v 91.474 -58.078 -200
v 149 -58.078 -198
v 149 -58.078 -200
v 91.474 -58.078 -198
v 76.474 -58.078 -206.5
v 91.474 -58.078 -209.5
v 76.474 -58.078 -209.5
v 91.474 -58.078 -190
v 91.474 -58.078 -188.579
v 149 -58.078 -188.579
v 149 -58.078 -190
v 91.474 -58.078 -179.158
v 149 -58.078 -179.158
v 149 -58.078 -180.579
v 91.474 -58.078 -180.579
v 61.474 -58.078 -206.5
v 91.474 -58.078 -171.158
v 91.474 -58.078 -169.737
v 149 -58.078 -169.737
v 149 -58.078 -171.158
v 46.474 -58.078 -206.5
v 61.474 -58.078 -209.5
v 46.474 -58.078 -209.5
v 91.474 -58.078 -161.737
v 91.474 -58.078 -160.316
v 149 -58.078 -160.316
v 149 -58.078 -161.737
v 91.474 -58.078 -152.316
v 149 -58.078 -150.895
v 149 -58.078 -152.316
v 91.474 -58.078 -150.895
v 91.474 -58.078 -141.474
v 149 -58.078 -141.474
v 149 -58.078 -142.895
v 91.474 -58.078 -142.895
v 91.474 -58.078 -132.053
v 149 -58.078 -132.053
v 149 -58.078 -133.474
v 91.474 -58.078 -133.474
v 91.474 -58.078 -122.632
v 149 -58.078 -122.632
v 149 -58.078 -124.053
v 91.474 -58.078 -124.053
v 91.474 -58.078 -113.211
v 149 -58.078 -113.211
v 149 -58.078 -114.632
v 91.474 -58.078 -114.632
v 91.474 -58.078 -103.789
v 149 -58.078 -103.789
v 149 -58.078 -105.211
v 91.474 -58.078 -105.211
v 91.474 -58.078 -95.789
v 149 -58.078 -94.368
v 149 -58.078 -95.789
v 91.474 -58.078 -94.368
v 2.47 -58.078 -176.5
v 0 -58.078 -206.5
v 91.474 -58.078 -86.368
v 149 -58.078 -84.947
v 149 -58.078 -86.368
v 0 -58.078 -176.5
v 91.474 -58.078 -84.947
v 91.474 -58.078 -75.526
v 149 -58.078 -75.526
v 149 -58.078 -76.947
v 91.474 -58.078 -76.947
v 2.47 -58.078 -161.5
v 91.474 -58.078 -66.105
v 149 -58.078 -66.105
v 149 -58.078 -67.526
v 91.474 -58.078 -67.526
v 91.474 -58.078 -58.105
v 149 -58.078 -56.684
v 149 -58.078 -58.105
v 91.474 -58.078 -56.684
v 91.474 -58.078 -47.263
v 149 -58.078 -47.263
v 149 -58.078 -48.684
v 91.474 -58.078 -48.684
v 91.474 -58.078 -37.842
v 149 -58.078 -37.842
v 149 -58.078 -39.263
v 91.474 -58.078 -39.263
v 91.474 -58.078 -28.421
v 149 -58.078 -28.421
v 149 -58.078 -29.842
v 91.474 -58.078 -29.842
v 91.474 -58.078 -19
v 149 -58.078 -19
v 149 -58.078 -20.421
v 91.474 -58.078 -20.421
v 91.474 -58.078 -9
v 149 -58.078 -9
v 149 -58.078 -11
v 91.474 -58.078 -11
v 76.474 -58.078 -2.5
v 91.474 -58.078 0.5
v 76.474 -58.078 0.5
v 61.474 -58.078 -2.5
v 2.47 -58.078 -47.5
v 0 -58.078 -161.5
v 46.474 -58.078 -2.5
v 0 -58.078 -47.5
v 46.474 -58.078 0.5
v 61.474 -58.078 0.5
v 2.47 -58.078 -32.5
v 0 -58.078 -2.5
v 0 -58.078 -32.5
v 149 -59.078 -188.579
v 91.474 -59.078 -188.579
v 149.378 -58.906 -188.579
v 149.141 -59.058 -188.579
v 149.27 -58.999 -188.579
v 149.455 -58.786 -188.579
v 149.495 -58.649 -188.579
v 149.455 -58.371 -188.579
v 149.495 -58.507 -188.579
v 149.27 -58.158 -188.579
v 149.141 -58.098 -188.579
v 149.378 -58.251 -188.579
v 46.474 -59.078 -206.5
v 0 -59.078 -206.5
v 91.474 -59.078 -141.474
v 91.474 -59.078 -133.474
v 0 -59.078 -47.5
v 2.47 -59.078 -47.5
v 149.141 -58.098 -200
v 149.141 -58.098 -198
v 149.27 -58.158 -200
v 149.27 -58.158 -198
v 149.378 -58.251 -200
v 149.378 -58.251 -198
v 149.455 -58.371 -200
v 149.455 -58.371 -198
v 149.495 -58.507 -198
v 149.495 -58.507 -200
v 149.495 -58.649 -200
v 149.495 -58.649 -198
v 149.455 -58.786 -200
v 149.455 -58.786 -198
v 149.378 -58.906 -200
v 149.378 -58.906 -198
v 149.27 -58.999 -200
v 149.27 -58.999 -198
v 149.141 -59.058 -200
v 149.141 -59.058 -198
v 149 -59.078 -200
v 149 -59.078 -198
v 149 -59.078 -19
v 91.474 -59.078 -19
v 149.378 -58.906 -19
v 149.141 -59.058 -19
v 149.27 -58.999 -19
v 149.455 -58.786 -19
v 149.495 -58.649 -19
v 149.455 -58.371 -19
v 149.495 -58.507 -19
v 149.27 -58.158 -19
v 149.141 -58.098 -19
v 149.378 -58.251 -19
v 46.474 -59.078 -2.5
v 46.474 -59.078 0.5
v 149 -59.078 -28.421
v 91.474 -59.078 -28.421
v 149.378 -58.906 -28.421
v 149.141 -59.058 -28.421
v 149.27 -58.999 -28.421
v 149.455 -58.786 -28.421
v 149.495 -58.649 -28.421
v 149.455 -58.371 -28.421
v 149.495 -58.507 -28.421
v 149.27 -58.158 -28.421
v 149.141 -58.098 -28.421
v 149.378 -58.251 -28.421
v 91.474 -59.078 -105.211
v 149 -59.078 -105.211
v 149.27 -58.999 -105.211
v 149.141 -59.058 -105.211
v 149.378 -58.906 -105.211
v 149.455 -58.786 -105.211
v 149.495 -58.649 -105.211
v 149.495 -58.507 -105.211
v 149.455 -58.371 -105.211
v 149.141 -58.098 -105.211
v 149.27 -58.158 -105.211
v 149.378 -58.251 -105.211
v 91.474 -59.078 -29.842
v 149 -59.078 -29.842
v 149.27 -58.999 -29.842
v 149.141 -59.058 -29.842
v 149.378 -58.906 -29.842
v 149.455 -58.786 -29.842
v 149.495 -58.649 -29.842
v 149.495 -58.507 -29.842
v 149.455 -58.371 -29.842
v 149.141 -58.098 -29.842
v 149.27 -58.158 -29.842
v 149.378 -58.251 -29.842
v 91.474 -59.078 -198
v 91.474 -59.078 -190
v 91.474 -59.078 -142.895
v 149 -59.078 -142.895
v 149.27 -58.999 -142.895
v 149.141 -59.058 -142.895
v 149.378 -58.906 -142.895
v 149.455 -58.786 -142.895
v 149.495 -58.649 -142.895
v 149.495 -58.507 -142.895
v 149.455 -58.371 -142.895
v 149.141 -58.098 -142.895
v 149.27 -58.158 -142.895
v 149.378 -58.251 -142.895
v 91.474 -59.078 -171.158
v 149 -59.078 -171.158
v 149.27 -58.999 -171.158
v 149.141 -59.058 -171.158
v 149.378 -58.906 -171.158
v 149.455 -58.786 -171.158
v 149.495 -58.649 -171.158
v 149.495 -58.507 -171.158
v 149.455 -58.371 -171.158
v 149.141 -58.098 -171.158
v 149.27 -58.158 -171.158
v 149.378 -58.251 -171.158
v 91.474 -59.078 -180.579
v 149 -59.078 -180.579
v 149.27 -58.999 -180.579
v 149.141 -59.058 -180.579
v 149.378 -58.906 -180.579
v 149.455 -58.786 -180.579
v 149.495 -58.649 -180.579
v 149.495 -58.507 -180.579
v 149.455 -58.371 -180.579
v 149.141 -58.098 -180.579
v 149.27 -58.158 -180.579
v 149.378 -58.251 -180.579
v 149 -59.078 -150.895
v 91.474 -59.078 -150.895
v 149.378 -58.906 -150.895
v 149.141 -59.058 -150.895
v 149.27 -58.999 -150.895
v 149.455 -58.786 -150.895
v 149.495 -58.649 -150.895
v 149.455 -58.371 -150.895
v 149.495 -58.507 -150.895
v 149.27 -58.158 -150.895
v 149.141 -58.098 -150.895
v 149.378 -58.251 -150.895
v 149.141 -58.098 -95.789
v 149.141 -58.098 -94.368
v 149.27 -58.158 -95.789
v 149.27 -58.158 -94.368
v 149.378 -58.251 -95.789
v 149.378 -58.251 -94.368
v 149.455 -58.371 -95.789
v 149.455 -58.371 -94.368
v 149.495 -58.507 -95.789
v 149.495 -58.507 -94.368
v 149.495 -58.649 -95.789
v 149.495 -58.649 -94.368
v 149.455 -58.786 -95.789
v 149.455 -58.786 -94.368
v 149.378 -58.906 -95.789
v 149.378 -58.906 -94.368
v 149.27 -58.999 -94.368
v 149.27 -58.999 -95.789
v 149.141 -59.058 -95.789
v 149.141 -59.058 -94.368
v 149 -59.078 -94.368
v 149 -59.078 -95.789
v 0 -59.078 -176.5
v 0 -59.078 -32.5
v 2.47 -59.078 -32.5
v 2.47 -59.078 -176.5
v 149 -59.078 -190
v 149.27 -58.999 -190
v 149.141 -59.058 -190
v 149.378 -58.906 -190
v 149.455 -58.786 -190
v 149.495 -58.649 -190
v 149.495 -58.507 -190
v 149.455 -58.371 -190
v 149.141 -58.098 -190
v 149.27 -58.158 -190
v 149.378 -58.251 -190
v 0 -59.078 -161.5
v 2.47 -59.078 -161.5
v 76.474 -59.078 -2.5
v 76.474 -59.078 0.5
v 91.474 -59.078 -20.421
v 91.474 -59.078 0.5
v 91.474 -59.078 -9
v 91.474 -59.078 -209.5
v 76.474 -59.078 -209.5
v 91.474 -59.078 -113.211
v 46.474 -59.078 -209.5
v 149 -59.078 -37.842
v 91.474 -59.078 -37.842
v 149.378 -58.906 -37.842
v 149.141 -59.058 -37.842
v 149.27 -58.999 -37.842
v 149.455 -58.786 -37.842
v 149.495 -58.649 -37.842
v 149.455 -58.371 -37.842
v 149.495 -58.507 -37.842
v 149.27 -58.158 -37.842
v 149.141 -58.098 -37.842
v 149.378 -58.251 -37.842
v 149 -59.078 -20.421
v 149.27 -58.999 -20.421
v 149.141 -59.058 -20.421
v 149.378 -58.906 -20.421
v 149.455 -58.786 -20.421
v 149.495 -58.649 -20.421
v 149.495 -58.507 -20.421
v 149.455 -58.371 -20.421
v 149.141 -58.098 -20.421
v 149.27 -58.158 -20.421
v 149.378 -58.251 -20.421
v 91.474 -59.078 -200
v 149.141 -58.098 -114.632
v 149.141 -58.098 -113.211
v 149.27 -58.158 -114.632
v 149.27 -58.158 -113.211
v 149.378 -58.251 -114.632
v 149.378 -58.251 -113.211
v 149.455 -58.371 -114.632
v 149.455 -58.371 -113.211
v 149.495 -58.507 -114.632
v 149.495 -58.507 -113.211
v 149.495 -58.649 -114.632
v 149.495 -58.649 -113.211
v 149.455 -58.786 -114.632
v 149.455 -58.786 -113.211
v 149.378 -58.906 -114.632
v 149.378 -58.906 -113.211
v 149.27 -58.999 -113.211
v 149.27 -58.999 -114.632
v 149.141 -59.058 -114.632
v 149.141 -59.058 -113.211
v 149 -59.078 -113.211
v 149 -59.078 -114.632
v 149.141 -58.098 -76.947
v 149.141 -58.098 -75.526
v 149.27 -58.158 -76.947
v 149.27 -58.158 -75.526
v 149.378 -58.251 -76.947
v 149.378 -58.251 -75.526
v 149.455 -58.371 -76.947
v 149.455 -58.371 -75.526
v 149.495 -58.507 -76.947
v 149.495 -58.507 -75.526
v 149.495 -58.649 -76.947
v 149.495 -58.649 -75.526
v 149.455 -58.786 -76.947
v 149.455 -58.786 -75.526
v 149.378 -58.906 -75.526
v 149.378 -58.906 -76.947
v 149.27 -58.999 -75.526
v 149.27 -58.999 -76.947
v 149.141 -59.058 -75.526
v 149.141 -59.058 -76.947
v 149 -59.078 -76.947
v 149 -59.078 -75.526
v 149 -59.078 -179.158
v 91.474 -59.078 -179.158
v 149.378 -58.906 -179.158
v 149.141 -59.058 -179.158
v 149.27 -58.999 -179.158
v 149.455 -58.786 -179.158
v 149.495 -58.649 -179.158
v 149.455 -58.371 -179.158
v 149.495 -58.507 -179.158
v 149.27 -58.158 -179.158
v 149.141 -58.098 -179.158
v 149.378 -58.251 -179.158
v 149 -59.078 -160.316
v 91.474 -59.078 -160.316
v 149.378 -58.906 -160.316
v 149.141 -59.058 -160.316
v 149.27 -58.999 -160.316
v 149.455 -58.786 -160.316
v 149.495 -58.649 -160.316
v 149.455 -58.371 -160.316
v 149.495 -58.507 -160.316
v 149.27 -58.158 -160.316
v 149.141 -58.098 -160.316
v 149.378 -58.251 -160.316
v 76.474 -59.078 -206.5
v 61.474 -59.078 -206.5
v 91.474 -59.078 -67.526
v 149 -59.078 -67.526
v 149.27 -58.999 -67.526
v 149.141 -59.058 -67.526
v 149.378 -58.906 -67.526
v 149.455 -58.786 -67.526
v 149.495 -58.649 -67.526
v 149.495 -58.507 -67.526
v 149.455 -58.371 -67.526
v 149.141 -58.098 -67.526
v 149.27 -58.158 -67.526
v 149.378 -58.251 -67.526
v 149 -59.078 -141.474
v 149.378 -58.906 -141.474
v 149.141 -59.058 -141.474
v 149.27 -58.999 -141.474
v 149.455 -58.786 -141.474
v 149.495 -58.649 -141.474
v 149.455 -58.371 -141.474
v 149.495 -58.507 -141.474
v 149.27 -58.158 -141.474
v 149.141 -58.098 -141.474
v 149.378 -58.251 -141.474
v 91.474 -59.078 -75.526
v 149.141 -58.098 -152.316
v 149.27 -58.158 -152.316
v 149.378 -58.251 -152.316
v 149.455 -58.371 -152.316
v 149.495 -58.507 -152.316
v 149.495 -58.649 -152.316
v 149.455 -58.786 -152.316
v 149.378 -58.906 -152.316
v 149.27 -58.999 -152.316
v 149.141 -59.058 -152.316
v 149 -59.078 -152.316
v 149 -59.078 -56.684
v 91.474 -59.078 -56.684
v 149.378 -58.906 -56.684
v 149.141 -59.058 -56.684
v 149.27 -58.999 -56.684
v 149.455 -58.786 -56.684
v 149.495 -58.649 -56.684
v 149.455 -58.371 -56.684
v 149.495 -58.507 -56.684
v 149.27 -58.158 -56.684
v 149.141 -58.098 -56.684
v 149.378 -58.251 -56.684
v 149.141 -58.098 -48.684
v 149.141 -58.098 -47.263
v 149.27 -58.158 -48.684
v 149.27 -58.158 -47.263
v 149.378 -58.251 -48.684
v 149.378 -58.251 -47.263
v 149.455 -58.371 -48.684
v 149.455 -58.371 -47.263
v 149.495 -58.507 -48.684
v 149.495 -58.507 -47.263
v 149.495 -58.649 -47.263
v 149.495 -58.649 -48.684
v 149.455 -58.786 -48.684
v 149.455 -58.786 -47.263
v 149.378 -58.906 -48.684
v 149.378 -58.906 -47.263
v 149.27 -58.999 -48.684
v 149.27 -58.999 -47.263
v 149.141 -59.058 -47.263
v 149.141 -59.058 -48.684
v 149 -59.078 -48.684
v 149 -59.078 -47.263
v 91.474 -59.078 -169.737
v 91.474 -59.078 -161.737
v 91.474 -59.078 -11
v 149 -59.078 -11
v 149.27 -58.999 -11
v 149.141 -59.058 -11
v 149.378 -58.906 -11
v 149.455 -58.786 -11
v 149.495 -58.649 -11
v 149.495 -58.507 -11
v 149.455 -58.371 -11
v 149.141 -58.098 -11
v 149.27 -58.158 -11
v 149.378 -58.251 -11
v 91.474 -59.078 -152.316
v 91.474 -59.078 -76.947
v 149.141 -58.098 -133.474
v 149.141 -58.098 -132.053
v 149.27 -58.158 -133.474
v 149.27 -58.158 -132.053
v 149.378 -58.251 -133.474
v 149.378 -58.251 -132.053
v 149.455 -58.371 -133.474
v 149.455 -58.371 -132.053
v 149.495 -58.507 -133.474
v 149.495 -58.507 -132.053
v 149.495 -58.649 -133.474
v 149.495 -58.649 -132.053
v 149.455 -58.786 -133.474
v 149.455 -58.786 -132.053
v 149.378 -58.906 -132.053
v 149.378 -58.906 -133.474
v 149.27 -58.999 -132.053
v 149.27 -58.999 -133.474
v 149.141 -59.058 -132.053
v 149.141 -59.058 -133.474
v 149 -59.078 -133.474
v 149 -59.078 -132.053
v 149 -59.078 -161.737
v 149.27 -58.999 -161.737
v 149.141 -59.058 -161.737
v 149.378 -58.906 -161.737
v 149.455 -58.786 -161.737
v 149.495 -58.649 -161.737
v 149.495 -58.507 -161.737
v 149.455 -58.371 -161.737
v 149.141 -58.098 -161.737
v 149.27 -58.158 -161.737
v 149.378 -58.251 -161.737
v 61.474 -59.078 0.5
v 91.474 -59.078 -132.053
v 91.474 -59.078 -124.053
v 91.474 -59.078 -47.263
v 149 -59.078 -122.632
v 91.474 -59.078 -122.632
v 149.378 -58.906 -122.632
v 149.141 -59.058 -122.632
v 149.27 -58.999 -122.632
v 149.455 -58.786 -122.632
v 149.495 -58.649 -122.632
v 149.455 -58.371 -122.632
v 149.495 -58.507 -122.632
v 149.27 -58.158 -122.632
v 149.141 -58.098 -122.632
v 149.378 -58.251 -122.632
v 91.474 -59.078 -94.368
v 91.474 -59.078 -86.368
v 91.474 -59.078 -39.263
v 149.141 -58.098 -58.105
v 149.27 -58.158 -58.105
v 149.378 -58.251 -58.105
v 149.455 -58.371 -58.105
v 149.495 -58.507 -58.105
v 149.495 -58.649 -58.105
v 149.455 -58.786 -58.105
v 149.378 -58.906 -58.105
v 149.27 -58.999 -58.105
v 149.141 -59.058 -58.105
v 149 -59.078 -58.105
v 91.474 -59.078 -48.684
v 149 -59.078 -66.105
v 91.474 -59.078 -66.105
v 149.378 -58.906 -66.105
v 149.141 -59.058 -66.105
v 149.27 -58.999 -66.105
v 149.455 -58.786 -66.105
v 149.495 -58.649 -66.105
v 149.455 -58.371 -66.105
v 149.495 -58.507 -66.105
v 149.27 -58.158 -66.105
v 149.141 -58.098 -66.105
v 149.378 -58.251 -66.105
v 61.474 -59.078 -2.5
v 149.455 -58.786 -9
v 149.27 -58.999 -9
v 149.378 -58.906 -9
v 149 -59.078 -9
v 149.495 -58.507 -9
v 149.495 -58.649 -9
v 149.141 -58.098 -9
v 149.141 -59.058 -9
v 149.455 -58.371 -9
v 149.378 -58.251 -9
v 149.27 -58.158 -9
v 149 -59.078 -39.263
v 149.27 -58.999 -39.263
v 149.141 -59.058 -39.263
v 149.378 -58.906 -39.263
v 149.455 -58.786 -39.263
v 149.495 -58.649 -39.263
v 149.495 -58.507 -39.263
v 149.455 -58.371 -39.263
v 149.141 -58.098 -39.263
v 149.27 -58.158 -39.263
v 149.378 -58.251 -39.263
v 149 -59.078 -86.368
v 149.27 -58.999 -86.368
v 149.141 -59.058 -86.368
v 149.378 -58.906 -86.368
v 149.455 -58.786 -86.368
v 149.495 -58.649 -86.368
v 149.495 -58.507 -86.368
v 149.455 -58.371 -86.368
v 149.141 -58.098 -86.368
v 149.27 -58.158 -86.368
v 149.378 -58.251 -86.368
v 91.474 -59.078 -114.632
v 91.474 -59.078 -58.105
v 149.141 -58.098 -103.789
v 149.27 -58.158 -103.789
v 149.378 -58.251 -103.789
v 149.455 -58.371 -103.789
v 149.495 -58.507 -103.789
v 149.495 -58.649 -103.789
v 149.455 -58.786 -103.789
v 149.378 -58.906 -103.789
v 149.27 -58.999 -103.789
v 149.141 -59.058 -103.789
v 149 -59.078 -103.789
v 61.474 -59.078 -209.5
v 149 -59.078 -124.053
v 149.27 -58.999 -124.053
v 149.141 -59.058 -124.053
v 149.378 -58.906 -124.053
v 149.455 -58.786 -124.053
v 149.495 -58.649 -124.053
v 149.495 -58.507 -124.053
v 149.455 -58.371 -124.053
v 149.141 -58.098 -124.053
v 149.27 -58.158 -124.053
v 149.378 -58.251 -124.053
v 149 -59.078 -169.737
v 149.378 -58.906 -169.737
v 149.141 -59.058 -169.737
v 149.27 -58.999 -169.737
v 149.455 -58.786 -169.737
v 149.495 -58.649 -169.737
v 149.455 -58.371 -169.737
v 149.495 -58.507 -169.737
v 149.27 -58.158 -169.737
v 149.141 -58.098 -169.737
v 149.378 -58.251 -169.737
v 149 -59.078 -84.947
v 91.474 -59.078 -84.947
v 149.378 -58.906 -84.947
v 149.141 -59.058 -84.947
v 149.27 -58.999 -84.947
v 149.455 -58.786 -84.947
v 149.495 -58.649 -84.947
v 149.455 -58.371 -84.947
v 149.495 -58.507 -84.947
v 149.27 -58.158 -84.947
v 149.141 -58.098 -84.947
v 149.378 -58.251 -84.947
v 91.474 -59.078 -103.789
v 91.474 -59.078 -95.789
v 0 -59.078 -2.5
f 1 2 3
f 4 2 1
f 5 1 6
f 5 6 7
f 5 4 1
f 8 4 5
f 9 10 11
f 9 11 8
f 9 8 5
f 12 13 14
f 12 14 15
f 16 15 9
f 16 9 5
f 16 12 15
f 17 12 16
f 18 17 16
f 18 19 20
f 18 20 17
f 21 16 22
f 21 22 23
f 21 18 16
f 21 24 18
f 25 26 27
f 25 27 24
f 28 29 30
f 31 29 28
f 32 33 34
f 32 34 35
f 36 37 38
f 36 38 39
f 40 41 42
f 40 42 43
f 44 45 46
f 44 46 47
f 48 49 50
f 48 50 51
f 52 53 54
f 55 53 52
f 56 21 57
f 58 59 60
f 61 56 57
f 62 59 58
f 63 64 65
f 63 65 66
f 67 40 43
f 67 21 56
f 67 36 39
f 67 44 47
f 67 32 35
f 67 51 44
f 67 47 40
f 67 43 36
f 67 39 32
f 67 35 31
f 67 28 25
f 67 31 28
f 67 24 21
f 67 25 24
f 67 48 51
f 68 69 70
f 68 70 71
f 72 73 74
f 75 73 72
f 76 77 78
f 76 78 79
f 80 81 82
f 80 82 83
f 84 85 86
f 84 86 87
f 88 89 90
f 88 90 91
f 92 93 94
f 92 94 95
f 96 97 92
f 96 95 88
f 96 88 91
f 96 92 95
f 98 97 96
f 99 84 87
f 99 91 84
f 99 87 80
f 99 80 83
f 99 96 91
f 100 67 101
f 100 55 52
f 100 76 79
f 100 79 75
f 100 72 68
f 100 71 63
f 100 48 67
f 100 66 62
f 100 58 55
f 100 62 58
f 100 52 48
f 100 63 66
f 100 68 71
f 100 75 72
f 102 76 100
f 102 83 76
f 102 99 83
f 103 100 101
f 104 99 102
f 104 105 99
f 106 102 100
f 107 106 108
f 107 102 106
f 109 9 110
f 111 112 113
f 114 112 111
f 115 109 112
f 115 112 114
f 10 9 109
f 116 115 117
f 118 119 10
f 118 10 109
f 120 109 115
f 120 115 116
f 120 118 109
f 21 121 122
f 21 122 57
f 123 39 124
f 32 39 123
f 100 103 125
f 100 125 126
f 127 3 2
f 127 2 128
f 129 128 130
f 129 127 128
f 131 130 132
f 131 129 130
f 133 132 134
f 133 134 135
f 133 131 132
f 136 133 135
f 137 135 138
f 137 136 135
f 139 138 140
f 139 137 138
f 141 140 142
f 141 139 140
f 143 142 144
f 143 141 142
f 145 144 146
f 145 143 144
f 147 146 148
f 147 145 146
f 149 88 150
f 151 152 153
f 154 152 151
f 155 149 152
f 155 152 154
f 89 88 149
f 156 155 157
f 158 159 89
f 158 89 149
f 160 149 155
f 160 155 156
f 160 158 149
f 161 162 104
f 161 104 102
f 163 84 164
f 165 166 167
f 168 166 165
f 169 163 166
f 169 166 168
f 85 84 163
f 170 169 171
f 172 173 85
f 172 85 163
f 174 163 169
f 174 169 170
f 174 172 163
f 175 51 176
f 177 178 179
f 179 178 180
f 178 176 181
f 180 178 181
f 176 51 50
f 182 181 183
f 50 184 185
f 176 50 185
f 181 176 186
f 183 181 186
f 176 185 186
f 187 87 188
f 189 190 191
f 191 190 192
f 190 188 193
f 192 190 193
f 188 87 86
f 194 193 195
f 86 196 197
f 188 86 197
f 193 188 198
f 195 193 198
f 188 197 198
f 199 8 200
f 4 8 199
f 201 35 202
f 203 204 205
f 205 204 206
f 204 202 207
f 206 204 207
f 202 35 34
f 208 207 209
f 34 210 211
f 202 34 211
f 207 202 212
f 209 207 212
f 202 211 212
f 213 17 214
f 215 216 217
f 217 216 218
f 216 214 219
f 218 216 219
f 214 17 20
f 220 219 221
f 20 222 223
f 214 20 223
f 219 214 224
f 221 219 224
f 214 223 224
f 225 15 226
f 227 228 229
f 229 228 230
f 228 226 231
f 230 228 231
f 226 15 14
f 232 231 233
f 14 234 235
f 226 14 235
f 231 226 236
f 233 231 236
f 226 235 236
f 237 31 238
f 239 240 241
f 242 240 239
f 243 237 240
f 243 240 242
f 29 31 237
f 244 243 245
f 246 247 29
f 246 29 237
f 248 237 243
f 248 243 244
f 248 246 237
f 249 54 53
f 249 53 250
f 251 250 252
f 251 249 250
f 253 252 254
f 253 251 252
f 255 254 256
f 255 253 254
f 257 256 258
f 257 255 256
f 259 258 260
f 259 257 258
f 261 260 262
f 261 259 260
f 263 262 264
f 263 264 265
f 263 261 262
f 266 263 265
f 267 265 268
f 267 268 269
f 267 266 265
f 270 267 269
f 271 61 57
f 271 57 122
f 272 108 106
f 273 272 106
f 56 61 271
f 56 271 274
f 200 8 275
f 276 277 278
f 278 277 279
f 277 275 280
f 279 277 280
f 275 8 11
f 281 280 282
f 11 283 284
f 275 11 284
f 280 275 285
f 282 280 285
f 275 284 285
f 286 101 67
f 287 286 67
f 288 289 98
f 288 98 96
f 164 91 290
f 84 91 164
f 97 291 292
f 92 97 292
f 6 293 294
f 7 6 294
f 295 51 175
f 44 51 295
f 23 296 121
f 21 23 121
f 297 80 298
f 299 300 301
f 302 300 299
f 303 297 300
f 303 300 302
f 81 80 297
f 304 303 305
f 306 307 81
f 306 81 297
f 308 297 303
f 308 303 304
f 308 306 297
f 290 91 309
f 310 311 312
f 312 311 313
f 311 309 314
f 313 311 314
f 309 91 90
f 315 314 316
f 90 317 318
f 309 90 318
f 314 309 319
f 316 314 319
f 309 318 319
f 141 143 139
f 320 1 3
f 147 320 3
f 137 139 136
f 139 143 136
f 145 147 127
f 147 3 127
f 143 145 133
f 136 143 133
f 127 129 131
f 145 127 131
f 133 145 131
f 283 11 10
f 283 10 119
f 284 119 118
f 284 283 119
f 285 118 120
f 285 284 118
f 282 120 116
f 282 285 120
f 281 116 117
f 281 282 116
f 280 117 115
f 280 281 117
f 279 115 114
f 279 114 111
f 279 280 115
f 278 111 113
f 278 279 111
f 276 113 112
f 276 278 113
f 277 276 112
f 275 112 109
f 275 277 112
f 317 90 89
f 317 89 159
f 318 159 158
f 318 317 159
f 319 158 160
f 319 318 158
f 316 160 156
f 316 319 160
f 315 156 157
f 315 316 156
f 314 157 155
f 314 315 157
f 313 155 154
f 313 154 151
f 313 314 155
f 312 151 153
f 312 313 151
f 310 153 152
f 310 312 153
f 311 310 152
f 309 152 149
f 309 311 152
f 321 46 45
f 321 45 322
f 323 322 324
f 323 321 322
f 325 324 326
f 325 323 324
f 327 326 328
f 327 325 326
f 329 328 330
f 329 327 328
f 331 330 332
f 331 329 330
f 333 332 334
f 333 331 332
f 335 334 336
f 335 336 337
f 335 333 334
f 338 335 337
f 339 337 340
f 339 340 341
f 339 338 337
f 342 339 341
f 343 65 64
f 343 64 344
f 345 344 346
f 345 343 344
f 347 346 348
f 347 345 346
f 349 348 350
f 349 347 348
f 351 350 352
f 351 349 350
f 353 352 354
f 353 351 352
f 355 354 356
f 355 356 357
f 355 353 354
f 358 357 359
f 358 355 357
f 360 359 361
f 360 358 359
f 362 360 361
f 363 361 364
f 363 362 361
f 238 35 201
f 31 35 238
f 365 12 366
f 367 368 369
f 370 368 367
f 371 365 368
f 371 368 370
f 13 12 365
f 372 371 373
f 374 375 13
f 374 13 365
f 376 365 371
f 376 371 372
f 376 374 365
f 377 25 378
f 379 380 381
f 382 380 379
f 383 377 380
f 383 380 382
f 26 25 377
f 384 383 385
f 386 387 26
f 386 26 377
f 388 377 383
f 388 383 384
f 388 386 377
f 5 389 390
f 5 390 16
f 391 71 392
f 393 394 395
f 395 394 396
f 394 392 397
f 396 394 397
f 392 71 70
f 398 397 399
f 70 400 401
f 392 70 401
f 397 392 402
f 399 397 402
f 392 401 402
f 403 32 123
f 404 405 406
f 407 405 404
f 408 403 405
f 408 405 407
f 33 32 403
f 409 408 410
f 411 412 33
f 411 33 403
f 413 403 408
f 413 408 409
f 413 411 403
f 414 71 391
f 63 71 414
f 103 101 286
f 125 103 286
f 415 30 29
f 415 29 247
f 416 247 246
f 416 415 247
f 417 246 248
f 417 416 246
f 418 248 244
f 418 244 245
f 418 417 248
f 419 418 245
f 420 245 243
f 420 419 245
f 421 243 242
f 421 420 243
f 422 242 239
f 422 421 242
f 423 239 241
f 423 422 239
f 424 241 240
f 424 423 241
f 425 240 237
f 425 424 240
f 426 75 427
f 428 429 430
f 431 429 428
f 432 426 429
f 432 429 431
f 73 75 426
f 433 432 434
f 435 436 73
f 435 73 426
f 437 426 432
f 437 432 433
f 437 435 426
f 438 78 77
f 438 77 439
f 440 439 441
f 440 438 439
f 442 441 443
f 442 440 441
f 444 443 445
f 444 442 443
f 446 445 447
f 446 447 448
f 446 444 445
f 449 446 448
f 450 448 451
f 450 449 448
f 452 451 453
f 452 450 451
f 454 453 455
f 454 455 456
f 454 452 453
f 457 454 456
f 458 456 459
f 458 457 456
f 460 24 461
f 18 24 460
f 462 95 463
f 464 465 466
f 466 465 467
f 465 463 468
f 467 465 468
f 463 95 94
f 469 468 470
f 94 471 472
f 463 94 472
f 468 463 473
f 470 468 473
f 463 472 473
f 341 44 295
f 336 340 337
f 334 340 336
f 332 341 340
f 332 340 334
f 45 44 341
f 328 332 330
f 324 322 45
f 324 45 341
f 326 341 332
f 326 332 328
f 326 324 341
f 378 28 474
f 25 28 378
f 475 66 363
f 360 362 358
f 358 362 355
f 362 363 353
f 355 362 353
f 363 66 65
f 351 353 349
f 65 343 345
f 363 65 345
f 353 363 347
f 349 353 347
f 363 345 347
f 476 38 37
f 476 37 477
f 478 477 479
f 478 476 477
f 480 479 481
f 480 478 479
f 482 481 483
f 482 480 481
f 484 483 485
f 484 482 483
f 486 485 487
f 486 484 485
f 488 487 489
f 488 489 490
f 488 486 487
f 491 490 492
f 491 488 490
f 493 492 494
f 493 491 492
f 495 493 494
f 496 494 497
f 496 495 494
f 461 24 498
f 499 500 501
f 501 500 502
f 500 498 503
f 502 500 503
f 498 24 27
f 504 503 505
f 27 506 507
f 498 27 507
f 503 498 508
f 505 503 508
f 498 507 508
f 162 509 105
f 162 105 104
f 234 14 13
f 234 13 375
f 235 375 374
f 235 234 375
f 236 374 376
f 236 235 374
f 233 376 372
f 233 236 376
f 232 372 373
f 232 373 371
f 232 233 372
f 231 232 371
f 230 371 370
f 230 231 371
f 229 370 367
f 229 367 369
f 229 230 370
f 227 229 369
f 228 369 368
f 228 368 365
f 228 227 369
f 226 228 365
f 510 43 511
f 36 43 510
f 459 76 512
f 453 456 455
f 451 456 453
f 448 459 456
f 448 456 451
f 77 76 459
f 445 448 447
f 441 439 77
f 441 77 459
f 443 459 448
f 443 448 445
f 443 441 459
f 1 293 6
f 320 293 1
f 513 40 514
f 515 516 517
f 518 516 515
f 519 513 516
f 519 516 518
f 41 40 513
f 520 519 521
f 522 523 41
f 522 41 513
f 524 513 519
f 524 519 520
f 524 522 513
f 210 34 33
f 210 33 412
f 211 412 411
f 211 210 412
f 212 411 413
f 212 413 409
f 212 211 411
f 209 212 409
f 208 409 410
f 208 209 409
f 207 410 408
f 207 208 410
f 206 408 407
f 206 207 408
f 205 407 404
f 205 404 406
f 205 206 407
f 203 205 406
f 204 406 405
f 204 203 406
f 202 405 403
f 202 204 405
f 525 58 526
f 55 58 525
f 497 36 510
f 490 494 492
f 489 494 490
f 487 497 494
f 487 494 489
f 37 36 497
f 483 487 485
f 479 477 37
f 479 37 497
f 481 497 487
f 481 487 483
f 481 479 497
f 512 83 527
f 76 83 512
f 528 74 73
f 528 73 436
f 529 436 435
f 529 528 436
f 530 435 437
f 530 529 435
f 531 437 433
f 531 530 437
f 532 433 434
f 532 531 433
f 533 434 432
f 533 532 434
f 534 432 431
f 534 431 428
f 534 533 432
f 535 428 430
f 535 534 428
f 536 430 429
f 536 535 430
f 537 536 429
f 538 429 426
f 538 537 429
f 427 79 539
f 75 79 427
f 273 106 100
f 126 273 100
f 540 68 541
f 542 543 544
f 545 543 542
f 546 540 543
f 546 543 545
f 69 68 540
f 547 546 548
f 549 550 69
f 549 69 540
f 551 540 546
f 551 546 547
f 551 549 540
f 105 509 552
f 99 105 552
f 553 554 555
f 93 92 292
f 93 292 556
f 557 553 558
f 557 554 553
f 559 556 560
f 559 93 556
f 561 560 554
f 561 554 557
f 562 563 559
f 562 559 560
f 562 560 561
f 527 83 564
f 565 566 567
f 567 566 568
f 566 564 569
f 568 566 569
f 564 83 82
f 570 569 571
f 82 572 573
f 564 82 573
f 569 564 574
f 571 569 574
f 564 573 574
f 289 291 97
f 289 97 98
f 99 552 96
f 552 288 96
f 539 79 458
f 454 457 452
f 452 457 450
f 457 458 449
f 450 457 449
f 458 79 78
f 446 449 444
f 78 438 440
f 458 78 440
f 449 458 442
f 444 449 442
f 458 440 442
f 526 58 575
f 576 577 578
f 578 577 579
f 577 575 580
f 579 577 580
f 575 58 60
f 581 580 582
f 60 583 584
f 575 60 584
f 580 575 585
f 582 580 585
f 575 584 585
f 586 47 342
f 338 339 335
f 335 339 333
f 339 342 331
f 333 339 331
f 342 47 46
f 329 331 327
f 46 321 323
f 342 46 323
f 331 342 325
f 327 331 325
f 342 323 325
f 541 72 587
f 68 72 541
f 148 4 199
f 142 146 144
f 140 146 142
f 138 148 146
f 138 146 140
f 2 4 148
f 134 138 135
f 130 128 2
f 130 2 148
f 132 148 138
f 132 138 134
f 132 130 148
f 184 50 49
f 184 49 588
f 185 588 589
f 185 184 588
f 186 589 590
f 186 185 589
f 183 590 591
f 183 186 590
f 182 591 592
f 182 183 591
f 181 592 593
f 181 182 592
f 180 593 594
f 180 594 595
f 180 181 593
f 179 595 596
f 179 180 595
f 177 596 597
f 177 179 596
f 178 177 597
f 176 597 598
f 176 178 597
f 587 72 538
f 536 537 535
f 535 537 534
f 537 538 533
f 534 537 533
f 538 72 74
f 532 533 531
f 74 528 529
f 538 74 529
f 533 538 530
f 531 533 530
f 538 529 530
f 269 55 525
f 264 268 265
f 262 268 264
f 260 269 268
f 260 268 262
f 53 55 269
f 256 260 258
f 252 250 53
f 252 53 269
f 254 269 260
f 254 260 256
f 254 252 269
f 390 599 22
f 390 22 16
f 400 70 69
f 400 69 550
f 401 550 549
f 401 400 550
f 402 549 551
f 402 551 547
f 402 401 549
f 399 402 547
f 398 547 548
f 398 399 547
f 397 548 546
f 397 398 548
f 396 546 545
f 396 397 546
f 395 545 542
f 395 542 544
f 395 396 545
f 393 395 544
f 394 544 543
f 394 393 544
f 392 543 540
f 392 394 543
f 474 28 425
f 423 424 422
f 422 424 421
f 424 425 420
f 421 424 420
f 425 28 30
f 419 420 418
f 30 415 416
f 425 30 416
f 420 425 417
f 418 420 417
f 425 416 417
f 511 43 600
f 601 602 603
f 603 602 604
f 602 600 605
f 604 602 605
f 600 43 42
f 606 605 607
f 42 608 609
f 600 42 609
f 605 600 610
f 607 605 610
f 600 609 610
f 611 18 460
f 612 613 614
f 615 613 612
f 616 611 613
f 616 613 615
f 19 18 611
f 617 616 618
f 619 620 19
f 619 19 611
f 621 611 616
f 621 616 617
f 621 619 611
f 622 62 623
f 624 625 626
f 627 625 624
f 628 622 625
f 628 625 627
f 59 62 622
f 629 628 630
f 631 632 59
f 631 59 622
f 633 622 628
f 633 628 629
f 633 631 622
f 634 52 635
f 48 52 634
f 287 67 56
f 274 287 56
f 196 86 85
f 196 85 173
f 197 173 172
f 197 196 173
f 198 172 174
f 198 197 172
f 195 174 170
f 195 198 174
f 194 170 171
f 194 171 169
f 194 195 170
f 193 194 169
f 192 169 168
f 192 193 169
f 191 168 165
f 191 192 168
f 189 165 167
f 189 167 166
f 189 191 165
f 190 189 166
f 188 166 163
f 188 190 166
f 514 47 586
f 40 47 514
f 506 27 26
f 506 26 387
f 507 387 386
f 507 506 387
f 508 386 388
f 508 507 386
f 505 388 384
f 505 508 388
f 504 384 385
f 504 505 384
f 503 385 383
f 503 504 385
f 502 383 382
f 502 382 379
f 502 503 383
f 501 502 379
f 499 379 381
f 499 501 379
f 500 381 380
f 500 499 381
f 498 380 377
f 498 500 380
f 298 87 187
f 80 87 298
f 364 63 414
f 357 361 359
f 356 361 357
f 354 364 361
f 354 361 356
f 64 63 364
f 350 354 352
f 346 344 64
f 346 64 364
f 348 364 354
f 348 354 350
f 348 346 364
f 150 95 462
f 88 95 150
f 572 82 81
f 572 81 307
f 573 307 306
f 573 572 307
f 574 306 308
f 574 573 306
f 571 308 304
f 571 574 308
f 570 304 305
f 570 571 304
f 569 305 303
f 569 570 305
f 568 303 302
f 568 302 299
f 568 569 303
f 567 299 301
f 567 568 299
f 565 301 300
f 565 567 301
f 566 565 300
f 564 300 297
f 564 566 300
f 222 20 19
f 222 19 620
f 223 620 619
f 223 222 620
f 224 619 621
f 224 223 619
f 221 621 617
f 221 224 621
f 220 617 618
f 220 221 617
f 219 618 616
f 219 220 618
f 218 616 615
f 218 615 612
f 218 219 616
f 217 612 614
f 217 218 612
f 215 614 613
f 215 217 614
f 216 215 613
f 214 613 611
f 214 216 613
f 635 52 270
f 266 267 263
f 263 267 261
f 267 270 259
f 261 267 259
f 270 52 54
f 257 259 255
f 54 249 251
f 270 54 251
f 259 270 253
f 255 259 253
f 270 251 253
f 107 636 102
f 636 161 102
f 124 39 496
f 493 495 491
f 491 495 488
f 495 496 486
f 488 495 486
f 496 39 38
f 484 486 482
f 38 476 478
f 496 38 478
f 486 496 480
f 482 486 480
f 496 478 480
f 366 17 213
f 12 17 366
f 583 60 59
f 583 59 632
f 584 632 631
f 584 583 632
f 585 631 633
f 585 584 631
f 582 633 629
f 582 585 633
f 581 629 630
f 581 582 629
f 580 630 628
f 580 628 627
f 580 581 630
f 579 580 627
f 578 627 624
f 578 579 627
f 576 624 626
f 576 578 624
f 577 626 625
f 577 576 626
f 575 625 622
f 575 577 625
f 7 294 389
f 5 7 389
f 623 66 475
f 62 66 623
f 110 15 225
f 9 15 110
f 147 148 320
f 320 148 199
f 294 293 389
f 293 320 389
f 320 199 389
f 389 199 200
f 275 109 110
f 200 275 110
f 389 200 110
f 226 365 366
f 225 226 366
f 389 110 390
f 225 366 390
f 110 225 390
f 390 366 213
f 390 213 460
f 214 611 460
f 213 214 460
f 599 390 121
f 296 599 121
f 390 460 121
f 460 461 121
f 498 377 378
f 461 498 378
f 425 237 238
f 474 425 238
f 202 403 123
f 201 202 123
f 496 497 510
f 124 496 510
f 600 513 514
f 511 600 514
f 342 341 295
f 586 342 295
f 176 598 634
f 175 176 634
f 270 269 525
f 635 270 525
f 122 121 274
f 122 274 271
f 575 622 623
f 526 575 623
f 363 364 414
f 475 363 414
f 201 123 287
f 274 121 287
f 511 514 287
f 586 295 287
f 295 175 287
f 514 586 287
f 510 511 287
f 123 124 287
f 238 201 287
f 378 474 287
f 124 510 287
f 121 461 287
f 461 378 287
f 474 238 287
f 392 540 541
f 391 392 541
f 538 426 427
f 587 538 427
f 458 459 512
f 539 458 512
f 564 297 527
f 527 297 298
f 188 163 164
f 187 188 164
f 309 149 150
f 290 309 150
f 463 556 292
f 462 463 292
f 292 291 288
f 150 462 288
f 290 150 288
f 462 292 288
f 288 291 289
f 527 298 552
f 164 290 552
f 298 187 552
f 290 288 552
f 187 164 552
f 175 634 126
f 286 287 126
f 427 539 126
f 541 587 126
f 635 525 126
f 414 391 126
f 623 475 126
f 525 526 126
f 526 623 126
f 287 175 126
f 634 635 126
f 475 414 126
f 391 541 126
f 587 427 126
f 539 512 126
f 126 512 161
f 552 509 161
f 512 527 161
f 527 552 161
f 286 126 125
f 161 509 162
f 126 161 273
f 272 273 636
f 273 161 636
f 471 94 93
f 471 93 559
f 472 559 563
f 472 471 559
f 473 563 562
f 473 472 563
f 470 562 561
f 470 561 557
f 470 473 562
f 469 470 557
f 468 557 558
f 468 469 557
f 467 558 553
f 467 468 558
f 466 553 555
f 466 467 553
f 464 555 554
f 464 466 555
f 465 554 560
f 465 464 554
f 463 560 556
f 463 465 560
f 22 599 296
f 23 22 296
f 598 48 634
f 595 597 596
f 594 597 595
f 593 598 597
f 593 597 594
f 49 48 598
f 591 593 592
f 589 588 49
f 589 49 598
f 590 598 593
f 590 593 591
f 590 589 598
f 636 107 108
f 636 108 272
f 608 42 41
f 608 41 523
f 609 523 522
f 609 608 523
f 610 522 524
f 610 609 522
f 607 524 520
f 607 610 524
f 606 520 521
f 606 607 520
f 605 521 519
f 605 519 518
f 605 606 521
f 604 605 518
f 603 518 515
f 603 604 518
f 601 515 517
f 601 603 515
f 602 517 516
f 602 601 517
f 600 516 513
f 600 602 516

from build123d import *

# Parameters (mm, degrees)
EXTRUDE_1_DEPTH     = 0.5
EXTRUDE_2_DEPTH     = 104.5
SKETCH_8_W          = 60
SKETCH_8_H          = 8
SKETCH_8_W_2        = 60.000005443
CUT_EXTRUDE_2_DEPTH = 10
EXTRUDE_4_DEPTH     = 2.5
SKETCH_7_R          = 3.5
SKETCH_7_R_2        = 0.5
CUT_EXTRUDE_4_DEPTH = 244
SKETCH_10_W         = 3
SKETCH_10_H         = 95.004122321
SKETCH_10_H_2       = 102.964943566
CUT_EXTRUDE_5_DEPTH = 284
SKETCH_11_W         = 204
SKETCH_11_H         = 57
CUT_EXTRUDE_6_DEPTH = 284
SKETCH_13_W         = 2.47
SKETCH_13_H         = 15
CUT_EXTRUDE_7_DEPTH = 284
SKETCH_14_W         = 15
SKETCH_14_H         = 3
EXTRUDE_5_DEPTH     = 1


with BuildPart() as part:
    # 草图1 → 凸台-拉伸1 (new body)
    with BuildSketch(Plane.XY):
        Polygon((0, -1.078212291), (0, -59.078212291), (150, -59.078212291), (150, -56.078212291), (24.720670391, -21.433997855), (24.720670391, -1.078212291), align=None)
    extrude(amount=EXTRUDE_1_DEPTH)

    # 草图2 → 凸台-拉伸2 (add)
    with BuildSketch(Plane(origin=(0, 0, 0), x_dir=(-1, 0, 0), z_dir=(0, 0, -1))):
        with BuildLine():
            Line((-2.47, -1.078212291), (-2.47, -58.078212291))
            Line((-2.47, -58.078212291), (-149, -58.078212291))
            ThreePointArc((-149, -58.078212291), (-149.5, -58.578212291), (-149, -59.078212291))
            Line((-149, -59.078212291), (0, -59.078212291))
            Line((0, -59.078212291), (0, -1.078212291))
            Line((0, -1.078212291), (-2.47, -1.078212291))
        make_face()
    extrude(amount=EXTRUDE_2_DEPTH)

    # 镜向3: part across plane


with BuildPart() as part_1:
    add(part.part)
    add(part.part.mirror(Plane(origin=(149, -58.578212291, -104.5), x_dir=(1, 0, 0), z_dir=(0, 0, -1))))

    # 草图8 → 切除-拉伸2 (cut)
    with BuildSketch(Plane(origin=(0, -58.078212291, 0), x_dir=(1, 0, 0), z_dir=(0, 1, 0))):
        with Locations((121.473716686, 5)):
            Rectangle(SKETCH_8_W, SKETCH_8_H)
        with Locations((121.473713965, 15)):
            Rectangle(SKETCH_8_W_2, SKETCH_8_H)
        with Locations((121.473713965, 24.421052632)):
            Rectangle(SKETCH_8_W_2, SKETCH_8_H)
        with Locations((121.473713965, 33.842105263)):
            Rectangle(SKETCH_8_W_2, SKETCH_8_H)
        with Locations((121.473713965, 43.263157895)):
            Rectangle(SKETCH_8_W_2, SKETCH_8_H)
        with Locations((121.473713965, 52.684210526)):
            Rectangle(SKETCH_8_W_2, SKETCH_8_H)
        with Locations((121.473713965, 62.105263158)):
            Rectangle(SKETCH_8_W_2, SKETCH_8_H)
        with Locations((121.473713965, 71.526315789)):
            Rectangle(SKETCH_8_W_2, SKETCH_8_H)
        with Locations((121.473713965, 80.947368421)):
            Rectangle(SKETCH_8_W_2, SKETCH_8_H)
        with Locations((121.473713965, 90.368421053)):
            Rectangle(SKETCH_8_W_2, SKETCH_8_H)
        with Locations((121.473713965, 99.789473684)):
            Rectangle(SKETCH_8_W_2, SKETCH_8_H)
        with Locations((121.473713965, 109.210526316)):
            Rectangle(SKETCH_8_W_2, SKETCH_8_H)
        with Locations((121.473713965, 118.631578947)):
            Rectangle(SKETCH_8_W_2, SKETCH_8_H)
        with Locations((121.473713965, 128.052631579)):
            Rectangle(SKETCH_8_W_2, SKETCH_8_H)
        with Locations((121.473713965, 137.473684211)):
            Rectangle(SKETCH_8_W_2, SKETCH_8_H)
        with Locations((121.473713965, 146.894736842)):
            Rectangle(SKETCH_8_W_2, SKETCH_8_H)
        with Locations((121.473713965, 156.315789474)):
            Rectangle(SKETCH_8_W_2, SKETCH_8_H)
        with Locations((121.473713965, 165.736842105)):
            Rectangle(SKETCH_8_W_2, SKETCH_8_H)
        with Locations((121.473713965, 175.157894737)):
            Rectangle(SKETCH_8_W_2, SKETCH_8_H)
        with Locations((121.473713965, 184.578947368)):
            Rectangle(SKETCH_8_W_2, SKETCH_8_H)
        with Locations((121.473713965, 194)):
            Rectangle(SKETCH_8_W_2, SKETCH_8_H)
        with Locations((121.473716686, 204)):
            Rectangle(SKETCH_8_W, SKETCH_8_H)
    extrude(amount=-CUT_EXTRUDE_2_DEPTH, mode=Mode.SUBTRACT)

    # 草图1<3> → 凸台-拉伸4 (add)
    with BuildSketch(Plane.XY):
        Polygon((0, -1.078212291), (0, -59.078212291), (150, -59.078212291), (150, -56.078212291), (24.720670391, -21.433997855), (24.720670391, -1.078212291), align=None)
    extrude_4 = extrude(amount=-EXTRUDE_4_DEPTH)

    # 镜向4: 凸台-拉伸4 across plane
    add(extrude_4.mirror(Plane.XY.offset(-104.5)))

    # 镜向5: 凸台-拉伸4 across plane
    add(extrude_4.mirror(Plane.XY.offset(-104.5)))

    # 草图7 → 切除-拉伸4 (cut)
    with BuildSketch(Plane.XY.offset(0.5)):
        with Locations((8, -45.078212291)):
            Circle(SKETCH_7_R)
        with Locations((25, -45.078212291)):
            Circle(SKETCH_7_R_2)
        with Locations((23, -45.078212291)):
            Circle(SKETCH_7_R_2)
    extrude(amount=-CUT_EXTRUDE_4_DEPTH, mode=Mode.SUBTRACT)

    # 草图10 → 切除-拉伸5 (cut)
    with BuildSketch(Plane(origin=(150, 0, 0), x_dir=(0, 0, -1), z_dir=(1, 0, 0))):
        with Locations((1, -11.576151131)):
            Rectangle(SKETCH_10_W, SKETCH_10_H)
        with Locations((208, -7.595740508)):
            Rectangle(SKETCH_10_W, SKETCH_10_H_2)
    extrude(amount=-CUT_EXTRUDE_5_DEPTH, mode=Mode.SUBTRACT)

    # 草图11 → 切除-拉伸6 (cut)
    with BuildSketch(Plane(origin=(2.47, 0, 0), x_dir=(0, 0, -1), z_dir=(1, 0, 0))):
        with Locations((104.5, -29.578212291)):
            Rectangle(SKETCH_11_W, SKETCH_11_H)
    extrude(amount=-CUT_EXTRUDE_6_DEPTH, mode=Mode.SUBTRACT)

    # 草图13 → 切除-拉伸7 (cut)
    with BuildSketch(Plane(origin=(0, -58.078212291, 0), x_dir=(1, 0, 0), z_dir=(0, 1, 0))):
        with Locations((1.235, 40)):
            Rectangle(SKETCH_13_W, SKETCH_13_H)
        with Locations((1.235, 169)):
            Rectangle(SKETCH_13_W, SKETCH_13_H)
    extrude(amount=-CUT_EXTRUDE_7_DEPTH, mode=Mode.SUBTRACT)

    # 草图14 → 凸台-拉伸5 (add)
    with BuildSketch(Plane(origin=(0, -59.078212291, 0), x_dir=(-1, 0, 0), z_dir=(0, -1, 0))):
        with Locations((-83.973716686, 1)):
            Rectangle(SKETCH_14_W, SKETCH_14_H)
        with Locations((-53.973716686, 1)):
            Rectangle(SKETCH_14_W, SKETCH_14_H)
    extrude_5 = extrude(amount=-EXTRUDE_5_DEPTH)

    # 镜向6: 凸台-拉伸5 across plane
    add(extrude_5.mirror(Plane.XY.offset(-104.5)))


solid = part_1.part
